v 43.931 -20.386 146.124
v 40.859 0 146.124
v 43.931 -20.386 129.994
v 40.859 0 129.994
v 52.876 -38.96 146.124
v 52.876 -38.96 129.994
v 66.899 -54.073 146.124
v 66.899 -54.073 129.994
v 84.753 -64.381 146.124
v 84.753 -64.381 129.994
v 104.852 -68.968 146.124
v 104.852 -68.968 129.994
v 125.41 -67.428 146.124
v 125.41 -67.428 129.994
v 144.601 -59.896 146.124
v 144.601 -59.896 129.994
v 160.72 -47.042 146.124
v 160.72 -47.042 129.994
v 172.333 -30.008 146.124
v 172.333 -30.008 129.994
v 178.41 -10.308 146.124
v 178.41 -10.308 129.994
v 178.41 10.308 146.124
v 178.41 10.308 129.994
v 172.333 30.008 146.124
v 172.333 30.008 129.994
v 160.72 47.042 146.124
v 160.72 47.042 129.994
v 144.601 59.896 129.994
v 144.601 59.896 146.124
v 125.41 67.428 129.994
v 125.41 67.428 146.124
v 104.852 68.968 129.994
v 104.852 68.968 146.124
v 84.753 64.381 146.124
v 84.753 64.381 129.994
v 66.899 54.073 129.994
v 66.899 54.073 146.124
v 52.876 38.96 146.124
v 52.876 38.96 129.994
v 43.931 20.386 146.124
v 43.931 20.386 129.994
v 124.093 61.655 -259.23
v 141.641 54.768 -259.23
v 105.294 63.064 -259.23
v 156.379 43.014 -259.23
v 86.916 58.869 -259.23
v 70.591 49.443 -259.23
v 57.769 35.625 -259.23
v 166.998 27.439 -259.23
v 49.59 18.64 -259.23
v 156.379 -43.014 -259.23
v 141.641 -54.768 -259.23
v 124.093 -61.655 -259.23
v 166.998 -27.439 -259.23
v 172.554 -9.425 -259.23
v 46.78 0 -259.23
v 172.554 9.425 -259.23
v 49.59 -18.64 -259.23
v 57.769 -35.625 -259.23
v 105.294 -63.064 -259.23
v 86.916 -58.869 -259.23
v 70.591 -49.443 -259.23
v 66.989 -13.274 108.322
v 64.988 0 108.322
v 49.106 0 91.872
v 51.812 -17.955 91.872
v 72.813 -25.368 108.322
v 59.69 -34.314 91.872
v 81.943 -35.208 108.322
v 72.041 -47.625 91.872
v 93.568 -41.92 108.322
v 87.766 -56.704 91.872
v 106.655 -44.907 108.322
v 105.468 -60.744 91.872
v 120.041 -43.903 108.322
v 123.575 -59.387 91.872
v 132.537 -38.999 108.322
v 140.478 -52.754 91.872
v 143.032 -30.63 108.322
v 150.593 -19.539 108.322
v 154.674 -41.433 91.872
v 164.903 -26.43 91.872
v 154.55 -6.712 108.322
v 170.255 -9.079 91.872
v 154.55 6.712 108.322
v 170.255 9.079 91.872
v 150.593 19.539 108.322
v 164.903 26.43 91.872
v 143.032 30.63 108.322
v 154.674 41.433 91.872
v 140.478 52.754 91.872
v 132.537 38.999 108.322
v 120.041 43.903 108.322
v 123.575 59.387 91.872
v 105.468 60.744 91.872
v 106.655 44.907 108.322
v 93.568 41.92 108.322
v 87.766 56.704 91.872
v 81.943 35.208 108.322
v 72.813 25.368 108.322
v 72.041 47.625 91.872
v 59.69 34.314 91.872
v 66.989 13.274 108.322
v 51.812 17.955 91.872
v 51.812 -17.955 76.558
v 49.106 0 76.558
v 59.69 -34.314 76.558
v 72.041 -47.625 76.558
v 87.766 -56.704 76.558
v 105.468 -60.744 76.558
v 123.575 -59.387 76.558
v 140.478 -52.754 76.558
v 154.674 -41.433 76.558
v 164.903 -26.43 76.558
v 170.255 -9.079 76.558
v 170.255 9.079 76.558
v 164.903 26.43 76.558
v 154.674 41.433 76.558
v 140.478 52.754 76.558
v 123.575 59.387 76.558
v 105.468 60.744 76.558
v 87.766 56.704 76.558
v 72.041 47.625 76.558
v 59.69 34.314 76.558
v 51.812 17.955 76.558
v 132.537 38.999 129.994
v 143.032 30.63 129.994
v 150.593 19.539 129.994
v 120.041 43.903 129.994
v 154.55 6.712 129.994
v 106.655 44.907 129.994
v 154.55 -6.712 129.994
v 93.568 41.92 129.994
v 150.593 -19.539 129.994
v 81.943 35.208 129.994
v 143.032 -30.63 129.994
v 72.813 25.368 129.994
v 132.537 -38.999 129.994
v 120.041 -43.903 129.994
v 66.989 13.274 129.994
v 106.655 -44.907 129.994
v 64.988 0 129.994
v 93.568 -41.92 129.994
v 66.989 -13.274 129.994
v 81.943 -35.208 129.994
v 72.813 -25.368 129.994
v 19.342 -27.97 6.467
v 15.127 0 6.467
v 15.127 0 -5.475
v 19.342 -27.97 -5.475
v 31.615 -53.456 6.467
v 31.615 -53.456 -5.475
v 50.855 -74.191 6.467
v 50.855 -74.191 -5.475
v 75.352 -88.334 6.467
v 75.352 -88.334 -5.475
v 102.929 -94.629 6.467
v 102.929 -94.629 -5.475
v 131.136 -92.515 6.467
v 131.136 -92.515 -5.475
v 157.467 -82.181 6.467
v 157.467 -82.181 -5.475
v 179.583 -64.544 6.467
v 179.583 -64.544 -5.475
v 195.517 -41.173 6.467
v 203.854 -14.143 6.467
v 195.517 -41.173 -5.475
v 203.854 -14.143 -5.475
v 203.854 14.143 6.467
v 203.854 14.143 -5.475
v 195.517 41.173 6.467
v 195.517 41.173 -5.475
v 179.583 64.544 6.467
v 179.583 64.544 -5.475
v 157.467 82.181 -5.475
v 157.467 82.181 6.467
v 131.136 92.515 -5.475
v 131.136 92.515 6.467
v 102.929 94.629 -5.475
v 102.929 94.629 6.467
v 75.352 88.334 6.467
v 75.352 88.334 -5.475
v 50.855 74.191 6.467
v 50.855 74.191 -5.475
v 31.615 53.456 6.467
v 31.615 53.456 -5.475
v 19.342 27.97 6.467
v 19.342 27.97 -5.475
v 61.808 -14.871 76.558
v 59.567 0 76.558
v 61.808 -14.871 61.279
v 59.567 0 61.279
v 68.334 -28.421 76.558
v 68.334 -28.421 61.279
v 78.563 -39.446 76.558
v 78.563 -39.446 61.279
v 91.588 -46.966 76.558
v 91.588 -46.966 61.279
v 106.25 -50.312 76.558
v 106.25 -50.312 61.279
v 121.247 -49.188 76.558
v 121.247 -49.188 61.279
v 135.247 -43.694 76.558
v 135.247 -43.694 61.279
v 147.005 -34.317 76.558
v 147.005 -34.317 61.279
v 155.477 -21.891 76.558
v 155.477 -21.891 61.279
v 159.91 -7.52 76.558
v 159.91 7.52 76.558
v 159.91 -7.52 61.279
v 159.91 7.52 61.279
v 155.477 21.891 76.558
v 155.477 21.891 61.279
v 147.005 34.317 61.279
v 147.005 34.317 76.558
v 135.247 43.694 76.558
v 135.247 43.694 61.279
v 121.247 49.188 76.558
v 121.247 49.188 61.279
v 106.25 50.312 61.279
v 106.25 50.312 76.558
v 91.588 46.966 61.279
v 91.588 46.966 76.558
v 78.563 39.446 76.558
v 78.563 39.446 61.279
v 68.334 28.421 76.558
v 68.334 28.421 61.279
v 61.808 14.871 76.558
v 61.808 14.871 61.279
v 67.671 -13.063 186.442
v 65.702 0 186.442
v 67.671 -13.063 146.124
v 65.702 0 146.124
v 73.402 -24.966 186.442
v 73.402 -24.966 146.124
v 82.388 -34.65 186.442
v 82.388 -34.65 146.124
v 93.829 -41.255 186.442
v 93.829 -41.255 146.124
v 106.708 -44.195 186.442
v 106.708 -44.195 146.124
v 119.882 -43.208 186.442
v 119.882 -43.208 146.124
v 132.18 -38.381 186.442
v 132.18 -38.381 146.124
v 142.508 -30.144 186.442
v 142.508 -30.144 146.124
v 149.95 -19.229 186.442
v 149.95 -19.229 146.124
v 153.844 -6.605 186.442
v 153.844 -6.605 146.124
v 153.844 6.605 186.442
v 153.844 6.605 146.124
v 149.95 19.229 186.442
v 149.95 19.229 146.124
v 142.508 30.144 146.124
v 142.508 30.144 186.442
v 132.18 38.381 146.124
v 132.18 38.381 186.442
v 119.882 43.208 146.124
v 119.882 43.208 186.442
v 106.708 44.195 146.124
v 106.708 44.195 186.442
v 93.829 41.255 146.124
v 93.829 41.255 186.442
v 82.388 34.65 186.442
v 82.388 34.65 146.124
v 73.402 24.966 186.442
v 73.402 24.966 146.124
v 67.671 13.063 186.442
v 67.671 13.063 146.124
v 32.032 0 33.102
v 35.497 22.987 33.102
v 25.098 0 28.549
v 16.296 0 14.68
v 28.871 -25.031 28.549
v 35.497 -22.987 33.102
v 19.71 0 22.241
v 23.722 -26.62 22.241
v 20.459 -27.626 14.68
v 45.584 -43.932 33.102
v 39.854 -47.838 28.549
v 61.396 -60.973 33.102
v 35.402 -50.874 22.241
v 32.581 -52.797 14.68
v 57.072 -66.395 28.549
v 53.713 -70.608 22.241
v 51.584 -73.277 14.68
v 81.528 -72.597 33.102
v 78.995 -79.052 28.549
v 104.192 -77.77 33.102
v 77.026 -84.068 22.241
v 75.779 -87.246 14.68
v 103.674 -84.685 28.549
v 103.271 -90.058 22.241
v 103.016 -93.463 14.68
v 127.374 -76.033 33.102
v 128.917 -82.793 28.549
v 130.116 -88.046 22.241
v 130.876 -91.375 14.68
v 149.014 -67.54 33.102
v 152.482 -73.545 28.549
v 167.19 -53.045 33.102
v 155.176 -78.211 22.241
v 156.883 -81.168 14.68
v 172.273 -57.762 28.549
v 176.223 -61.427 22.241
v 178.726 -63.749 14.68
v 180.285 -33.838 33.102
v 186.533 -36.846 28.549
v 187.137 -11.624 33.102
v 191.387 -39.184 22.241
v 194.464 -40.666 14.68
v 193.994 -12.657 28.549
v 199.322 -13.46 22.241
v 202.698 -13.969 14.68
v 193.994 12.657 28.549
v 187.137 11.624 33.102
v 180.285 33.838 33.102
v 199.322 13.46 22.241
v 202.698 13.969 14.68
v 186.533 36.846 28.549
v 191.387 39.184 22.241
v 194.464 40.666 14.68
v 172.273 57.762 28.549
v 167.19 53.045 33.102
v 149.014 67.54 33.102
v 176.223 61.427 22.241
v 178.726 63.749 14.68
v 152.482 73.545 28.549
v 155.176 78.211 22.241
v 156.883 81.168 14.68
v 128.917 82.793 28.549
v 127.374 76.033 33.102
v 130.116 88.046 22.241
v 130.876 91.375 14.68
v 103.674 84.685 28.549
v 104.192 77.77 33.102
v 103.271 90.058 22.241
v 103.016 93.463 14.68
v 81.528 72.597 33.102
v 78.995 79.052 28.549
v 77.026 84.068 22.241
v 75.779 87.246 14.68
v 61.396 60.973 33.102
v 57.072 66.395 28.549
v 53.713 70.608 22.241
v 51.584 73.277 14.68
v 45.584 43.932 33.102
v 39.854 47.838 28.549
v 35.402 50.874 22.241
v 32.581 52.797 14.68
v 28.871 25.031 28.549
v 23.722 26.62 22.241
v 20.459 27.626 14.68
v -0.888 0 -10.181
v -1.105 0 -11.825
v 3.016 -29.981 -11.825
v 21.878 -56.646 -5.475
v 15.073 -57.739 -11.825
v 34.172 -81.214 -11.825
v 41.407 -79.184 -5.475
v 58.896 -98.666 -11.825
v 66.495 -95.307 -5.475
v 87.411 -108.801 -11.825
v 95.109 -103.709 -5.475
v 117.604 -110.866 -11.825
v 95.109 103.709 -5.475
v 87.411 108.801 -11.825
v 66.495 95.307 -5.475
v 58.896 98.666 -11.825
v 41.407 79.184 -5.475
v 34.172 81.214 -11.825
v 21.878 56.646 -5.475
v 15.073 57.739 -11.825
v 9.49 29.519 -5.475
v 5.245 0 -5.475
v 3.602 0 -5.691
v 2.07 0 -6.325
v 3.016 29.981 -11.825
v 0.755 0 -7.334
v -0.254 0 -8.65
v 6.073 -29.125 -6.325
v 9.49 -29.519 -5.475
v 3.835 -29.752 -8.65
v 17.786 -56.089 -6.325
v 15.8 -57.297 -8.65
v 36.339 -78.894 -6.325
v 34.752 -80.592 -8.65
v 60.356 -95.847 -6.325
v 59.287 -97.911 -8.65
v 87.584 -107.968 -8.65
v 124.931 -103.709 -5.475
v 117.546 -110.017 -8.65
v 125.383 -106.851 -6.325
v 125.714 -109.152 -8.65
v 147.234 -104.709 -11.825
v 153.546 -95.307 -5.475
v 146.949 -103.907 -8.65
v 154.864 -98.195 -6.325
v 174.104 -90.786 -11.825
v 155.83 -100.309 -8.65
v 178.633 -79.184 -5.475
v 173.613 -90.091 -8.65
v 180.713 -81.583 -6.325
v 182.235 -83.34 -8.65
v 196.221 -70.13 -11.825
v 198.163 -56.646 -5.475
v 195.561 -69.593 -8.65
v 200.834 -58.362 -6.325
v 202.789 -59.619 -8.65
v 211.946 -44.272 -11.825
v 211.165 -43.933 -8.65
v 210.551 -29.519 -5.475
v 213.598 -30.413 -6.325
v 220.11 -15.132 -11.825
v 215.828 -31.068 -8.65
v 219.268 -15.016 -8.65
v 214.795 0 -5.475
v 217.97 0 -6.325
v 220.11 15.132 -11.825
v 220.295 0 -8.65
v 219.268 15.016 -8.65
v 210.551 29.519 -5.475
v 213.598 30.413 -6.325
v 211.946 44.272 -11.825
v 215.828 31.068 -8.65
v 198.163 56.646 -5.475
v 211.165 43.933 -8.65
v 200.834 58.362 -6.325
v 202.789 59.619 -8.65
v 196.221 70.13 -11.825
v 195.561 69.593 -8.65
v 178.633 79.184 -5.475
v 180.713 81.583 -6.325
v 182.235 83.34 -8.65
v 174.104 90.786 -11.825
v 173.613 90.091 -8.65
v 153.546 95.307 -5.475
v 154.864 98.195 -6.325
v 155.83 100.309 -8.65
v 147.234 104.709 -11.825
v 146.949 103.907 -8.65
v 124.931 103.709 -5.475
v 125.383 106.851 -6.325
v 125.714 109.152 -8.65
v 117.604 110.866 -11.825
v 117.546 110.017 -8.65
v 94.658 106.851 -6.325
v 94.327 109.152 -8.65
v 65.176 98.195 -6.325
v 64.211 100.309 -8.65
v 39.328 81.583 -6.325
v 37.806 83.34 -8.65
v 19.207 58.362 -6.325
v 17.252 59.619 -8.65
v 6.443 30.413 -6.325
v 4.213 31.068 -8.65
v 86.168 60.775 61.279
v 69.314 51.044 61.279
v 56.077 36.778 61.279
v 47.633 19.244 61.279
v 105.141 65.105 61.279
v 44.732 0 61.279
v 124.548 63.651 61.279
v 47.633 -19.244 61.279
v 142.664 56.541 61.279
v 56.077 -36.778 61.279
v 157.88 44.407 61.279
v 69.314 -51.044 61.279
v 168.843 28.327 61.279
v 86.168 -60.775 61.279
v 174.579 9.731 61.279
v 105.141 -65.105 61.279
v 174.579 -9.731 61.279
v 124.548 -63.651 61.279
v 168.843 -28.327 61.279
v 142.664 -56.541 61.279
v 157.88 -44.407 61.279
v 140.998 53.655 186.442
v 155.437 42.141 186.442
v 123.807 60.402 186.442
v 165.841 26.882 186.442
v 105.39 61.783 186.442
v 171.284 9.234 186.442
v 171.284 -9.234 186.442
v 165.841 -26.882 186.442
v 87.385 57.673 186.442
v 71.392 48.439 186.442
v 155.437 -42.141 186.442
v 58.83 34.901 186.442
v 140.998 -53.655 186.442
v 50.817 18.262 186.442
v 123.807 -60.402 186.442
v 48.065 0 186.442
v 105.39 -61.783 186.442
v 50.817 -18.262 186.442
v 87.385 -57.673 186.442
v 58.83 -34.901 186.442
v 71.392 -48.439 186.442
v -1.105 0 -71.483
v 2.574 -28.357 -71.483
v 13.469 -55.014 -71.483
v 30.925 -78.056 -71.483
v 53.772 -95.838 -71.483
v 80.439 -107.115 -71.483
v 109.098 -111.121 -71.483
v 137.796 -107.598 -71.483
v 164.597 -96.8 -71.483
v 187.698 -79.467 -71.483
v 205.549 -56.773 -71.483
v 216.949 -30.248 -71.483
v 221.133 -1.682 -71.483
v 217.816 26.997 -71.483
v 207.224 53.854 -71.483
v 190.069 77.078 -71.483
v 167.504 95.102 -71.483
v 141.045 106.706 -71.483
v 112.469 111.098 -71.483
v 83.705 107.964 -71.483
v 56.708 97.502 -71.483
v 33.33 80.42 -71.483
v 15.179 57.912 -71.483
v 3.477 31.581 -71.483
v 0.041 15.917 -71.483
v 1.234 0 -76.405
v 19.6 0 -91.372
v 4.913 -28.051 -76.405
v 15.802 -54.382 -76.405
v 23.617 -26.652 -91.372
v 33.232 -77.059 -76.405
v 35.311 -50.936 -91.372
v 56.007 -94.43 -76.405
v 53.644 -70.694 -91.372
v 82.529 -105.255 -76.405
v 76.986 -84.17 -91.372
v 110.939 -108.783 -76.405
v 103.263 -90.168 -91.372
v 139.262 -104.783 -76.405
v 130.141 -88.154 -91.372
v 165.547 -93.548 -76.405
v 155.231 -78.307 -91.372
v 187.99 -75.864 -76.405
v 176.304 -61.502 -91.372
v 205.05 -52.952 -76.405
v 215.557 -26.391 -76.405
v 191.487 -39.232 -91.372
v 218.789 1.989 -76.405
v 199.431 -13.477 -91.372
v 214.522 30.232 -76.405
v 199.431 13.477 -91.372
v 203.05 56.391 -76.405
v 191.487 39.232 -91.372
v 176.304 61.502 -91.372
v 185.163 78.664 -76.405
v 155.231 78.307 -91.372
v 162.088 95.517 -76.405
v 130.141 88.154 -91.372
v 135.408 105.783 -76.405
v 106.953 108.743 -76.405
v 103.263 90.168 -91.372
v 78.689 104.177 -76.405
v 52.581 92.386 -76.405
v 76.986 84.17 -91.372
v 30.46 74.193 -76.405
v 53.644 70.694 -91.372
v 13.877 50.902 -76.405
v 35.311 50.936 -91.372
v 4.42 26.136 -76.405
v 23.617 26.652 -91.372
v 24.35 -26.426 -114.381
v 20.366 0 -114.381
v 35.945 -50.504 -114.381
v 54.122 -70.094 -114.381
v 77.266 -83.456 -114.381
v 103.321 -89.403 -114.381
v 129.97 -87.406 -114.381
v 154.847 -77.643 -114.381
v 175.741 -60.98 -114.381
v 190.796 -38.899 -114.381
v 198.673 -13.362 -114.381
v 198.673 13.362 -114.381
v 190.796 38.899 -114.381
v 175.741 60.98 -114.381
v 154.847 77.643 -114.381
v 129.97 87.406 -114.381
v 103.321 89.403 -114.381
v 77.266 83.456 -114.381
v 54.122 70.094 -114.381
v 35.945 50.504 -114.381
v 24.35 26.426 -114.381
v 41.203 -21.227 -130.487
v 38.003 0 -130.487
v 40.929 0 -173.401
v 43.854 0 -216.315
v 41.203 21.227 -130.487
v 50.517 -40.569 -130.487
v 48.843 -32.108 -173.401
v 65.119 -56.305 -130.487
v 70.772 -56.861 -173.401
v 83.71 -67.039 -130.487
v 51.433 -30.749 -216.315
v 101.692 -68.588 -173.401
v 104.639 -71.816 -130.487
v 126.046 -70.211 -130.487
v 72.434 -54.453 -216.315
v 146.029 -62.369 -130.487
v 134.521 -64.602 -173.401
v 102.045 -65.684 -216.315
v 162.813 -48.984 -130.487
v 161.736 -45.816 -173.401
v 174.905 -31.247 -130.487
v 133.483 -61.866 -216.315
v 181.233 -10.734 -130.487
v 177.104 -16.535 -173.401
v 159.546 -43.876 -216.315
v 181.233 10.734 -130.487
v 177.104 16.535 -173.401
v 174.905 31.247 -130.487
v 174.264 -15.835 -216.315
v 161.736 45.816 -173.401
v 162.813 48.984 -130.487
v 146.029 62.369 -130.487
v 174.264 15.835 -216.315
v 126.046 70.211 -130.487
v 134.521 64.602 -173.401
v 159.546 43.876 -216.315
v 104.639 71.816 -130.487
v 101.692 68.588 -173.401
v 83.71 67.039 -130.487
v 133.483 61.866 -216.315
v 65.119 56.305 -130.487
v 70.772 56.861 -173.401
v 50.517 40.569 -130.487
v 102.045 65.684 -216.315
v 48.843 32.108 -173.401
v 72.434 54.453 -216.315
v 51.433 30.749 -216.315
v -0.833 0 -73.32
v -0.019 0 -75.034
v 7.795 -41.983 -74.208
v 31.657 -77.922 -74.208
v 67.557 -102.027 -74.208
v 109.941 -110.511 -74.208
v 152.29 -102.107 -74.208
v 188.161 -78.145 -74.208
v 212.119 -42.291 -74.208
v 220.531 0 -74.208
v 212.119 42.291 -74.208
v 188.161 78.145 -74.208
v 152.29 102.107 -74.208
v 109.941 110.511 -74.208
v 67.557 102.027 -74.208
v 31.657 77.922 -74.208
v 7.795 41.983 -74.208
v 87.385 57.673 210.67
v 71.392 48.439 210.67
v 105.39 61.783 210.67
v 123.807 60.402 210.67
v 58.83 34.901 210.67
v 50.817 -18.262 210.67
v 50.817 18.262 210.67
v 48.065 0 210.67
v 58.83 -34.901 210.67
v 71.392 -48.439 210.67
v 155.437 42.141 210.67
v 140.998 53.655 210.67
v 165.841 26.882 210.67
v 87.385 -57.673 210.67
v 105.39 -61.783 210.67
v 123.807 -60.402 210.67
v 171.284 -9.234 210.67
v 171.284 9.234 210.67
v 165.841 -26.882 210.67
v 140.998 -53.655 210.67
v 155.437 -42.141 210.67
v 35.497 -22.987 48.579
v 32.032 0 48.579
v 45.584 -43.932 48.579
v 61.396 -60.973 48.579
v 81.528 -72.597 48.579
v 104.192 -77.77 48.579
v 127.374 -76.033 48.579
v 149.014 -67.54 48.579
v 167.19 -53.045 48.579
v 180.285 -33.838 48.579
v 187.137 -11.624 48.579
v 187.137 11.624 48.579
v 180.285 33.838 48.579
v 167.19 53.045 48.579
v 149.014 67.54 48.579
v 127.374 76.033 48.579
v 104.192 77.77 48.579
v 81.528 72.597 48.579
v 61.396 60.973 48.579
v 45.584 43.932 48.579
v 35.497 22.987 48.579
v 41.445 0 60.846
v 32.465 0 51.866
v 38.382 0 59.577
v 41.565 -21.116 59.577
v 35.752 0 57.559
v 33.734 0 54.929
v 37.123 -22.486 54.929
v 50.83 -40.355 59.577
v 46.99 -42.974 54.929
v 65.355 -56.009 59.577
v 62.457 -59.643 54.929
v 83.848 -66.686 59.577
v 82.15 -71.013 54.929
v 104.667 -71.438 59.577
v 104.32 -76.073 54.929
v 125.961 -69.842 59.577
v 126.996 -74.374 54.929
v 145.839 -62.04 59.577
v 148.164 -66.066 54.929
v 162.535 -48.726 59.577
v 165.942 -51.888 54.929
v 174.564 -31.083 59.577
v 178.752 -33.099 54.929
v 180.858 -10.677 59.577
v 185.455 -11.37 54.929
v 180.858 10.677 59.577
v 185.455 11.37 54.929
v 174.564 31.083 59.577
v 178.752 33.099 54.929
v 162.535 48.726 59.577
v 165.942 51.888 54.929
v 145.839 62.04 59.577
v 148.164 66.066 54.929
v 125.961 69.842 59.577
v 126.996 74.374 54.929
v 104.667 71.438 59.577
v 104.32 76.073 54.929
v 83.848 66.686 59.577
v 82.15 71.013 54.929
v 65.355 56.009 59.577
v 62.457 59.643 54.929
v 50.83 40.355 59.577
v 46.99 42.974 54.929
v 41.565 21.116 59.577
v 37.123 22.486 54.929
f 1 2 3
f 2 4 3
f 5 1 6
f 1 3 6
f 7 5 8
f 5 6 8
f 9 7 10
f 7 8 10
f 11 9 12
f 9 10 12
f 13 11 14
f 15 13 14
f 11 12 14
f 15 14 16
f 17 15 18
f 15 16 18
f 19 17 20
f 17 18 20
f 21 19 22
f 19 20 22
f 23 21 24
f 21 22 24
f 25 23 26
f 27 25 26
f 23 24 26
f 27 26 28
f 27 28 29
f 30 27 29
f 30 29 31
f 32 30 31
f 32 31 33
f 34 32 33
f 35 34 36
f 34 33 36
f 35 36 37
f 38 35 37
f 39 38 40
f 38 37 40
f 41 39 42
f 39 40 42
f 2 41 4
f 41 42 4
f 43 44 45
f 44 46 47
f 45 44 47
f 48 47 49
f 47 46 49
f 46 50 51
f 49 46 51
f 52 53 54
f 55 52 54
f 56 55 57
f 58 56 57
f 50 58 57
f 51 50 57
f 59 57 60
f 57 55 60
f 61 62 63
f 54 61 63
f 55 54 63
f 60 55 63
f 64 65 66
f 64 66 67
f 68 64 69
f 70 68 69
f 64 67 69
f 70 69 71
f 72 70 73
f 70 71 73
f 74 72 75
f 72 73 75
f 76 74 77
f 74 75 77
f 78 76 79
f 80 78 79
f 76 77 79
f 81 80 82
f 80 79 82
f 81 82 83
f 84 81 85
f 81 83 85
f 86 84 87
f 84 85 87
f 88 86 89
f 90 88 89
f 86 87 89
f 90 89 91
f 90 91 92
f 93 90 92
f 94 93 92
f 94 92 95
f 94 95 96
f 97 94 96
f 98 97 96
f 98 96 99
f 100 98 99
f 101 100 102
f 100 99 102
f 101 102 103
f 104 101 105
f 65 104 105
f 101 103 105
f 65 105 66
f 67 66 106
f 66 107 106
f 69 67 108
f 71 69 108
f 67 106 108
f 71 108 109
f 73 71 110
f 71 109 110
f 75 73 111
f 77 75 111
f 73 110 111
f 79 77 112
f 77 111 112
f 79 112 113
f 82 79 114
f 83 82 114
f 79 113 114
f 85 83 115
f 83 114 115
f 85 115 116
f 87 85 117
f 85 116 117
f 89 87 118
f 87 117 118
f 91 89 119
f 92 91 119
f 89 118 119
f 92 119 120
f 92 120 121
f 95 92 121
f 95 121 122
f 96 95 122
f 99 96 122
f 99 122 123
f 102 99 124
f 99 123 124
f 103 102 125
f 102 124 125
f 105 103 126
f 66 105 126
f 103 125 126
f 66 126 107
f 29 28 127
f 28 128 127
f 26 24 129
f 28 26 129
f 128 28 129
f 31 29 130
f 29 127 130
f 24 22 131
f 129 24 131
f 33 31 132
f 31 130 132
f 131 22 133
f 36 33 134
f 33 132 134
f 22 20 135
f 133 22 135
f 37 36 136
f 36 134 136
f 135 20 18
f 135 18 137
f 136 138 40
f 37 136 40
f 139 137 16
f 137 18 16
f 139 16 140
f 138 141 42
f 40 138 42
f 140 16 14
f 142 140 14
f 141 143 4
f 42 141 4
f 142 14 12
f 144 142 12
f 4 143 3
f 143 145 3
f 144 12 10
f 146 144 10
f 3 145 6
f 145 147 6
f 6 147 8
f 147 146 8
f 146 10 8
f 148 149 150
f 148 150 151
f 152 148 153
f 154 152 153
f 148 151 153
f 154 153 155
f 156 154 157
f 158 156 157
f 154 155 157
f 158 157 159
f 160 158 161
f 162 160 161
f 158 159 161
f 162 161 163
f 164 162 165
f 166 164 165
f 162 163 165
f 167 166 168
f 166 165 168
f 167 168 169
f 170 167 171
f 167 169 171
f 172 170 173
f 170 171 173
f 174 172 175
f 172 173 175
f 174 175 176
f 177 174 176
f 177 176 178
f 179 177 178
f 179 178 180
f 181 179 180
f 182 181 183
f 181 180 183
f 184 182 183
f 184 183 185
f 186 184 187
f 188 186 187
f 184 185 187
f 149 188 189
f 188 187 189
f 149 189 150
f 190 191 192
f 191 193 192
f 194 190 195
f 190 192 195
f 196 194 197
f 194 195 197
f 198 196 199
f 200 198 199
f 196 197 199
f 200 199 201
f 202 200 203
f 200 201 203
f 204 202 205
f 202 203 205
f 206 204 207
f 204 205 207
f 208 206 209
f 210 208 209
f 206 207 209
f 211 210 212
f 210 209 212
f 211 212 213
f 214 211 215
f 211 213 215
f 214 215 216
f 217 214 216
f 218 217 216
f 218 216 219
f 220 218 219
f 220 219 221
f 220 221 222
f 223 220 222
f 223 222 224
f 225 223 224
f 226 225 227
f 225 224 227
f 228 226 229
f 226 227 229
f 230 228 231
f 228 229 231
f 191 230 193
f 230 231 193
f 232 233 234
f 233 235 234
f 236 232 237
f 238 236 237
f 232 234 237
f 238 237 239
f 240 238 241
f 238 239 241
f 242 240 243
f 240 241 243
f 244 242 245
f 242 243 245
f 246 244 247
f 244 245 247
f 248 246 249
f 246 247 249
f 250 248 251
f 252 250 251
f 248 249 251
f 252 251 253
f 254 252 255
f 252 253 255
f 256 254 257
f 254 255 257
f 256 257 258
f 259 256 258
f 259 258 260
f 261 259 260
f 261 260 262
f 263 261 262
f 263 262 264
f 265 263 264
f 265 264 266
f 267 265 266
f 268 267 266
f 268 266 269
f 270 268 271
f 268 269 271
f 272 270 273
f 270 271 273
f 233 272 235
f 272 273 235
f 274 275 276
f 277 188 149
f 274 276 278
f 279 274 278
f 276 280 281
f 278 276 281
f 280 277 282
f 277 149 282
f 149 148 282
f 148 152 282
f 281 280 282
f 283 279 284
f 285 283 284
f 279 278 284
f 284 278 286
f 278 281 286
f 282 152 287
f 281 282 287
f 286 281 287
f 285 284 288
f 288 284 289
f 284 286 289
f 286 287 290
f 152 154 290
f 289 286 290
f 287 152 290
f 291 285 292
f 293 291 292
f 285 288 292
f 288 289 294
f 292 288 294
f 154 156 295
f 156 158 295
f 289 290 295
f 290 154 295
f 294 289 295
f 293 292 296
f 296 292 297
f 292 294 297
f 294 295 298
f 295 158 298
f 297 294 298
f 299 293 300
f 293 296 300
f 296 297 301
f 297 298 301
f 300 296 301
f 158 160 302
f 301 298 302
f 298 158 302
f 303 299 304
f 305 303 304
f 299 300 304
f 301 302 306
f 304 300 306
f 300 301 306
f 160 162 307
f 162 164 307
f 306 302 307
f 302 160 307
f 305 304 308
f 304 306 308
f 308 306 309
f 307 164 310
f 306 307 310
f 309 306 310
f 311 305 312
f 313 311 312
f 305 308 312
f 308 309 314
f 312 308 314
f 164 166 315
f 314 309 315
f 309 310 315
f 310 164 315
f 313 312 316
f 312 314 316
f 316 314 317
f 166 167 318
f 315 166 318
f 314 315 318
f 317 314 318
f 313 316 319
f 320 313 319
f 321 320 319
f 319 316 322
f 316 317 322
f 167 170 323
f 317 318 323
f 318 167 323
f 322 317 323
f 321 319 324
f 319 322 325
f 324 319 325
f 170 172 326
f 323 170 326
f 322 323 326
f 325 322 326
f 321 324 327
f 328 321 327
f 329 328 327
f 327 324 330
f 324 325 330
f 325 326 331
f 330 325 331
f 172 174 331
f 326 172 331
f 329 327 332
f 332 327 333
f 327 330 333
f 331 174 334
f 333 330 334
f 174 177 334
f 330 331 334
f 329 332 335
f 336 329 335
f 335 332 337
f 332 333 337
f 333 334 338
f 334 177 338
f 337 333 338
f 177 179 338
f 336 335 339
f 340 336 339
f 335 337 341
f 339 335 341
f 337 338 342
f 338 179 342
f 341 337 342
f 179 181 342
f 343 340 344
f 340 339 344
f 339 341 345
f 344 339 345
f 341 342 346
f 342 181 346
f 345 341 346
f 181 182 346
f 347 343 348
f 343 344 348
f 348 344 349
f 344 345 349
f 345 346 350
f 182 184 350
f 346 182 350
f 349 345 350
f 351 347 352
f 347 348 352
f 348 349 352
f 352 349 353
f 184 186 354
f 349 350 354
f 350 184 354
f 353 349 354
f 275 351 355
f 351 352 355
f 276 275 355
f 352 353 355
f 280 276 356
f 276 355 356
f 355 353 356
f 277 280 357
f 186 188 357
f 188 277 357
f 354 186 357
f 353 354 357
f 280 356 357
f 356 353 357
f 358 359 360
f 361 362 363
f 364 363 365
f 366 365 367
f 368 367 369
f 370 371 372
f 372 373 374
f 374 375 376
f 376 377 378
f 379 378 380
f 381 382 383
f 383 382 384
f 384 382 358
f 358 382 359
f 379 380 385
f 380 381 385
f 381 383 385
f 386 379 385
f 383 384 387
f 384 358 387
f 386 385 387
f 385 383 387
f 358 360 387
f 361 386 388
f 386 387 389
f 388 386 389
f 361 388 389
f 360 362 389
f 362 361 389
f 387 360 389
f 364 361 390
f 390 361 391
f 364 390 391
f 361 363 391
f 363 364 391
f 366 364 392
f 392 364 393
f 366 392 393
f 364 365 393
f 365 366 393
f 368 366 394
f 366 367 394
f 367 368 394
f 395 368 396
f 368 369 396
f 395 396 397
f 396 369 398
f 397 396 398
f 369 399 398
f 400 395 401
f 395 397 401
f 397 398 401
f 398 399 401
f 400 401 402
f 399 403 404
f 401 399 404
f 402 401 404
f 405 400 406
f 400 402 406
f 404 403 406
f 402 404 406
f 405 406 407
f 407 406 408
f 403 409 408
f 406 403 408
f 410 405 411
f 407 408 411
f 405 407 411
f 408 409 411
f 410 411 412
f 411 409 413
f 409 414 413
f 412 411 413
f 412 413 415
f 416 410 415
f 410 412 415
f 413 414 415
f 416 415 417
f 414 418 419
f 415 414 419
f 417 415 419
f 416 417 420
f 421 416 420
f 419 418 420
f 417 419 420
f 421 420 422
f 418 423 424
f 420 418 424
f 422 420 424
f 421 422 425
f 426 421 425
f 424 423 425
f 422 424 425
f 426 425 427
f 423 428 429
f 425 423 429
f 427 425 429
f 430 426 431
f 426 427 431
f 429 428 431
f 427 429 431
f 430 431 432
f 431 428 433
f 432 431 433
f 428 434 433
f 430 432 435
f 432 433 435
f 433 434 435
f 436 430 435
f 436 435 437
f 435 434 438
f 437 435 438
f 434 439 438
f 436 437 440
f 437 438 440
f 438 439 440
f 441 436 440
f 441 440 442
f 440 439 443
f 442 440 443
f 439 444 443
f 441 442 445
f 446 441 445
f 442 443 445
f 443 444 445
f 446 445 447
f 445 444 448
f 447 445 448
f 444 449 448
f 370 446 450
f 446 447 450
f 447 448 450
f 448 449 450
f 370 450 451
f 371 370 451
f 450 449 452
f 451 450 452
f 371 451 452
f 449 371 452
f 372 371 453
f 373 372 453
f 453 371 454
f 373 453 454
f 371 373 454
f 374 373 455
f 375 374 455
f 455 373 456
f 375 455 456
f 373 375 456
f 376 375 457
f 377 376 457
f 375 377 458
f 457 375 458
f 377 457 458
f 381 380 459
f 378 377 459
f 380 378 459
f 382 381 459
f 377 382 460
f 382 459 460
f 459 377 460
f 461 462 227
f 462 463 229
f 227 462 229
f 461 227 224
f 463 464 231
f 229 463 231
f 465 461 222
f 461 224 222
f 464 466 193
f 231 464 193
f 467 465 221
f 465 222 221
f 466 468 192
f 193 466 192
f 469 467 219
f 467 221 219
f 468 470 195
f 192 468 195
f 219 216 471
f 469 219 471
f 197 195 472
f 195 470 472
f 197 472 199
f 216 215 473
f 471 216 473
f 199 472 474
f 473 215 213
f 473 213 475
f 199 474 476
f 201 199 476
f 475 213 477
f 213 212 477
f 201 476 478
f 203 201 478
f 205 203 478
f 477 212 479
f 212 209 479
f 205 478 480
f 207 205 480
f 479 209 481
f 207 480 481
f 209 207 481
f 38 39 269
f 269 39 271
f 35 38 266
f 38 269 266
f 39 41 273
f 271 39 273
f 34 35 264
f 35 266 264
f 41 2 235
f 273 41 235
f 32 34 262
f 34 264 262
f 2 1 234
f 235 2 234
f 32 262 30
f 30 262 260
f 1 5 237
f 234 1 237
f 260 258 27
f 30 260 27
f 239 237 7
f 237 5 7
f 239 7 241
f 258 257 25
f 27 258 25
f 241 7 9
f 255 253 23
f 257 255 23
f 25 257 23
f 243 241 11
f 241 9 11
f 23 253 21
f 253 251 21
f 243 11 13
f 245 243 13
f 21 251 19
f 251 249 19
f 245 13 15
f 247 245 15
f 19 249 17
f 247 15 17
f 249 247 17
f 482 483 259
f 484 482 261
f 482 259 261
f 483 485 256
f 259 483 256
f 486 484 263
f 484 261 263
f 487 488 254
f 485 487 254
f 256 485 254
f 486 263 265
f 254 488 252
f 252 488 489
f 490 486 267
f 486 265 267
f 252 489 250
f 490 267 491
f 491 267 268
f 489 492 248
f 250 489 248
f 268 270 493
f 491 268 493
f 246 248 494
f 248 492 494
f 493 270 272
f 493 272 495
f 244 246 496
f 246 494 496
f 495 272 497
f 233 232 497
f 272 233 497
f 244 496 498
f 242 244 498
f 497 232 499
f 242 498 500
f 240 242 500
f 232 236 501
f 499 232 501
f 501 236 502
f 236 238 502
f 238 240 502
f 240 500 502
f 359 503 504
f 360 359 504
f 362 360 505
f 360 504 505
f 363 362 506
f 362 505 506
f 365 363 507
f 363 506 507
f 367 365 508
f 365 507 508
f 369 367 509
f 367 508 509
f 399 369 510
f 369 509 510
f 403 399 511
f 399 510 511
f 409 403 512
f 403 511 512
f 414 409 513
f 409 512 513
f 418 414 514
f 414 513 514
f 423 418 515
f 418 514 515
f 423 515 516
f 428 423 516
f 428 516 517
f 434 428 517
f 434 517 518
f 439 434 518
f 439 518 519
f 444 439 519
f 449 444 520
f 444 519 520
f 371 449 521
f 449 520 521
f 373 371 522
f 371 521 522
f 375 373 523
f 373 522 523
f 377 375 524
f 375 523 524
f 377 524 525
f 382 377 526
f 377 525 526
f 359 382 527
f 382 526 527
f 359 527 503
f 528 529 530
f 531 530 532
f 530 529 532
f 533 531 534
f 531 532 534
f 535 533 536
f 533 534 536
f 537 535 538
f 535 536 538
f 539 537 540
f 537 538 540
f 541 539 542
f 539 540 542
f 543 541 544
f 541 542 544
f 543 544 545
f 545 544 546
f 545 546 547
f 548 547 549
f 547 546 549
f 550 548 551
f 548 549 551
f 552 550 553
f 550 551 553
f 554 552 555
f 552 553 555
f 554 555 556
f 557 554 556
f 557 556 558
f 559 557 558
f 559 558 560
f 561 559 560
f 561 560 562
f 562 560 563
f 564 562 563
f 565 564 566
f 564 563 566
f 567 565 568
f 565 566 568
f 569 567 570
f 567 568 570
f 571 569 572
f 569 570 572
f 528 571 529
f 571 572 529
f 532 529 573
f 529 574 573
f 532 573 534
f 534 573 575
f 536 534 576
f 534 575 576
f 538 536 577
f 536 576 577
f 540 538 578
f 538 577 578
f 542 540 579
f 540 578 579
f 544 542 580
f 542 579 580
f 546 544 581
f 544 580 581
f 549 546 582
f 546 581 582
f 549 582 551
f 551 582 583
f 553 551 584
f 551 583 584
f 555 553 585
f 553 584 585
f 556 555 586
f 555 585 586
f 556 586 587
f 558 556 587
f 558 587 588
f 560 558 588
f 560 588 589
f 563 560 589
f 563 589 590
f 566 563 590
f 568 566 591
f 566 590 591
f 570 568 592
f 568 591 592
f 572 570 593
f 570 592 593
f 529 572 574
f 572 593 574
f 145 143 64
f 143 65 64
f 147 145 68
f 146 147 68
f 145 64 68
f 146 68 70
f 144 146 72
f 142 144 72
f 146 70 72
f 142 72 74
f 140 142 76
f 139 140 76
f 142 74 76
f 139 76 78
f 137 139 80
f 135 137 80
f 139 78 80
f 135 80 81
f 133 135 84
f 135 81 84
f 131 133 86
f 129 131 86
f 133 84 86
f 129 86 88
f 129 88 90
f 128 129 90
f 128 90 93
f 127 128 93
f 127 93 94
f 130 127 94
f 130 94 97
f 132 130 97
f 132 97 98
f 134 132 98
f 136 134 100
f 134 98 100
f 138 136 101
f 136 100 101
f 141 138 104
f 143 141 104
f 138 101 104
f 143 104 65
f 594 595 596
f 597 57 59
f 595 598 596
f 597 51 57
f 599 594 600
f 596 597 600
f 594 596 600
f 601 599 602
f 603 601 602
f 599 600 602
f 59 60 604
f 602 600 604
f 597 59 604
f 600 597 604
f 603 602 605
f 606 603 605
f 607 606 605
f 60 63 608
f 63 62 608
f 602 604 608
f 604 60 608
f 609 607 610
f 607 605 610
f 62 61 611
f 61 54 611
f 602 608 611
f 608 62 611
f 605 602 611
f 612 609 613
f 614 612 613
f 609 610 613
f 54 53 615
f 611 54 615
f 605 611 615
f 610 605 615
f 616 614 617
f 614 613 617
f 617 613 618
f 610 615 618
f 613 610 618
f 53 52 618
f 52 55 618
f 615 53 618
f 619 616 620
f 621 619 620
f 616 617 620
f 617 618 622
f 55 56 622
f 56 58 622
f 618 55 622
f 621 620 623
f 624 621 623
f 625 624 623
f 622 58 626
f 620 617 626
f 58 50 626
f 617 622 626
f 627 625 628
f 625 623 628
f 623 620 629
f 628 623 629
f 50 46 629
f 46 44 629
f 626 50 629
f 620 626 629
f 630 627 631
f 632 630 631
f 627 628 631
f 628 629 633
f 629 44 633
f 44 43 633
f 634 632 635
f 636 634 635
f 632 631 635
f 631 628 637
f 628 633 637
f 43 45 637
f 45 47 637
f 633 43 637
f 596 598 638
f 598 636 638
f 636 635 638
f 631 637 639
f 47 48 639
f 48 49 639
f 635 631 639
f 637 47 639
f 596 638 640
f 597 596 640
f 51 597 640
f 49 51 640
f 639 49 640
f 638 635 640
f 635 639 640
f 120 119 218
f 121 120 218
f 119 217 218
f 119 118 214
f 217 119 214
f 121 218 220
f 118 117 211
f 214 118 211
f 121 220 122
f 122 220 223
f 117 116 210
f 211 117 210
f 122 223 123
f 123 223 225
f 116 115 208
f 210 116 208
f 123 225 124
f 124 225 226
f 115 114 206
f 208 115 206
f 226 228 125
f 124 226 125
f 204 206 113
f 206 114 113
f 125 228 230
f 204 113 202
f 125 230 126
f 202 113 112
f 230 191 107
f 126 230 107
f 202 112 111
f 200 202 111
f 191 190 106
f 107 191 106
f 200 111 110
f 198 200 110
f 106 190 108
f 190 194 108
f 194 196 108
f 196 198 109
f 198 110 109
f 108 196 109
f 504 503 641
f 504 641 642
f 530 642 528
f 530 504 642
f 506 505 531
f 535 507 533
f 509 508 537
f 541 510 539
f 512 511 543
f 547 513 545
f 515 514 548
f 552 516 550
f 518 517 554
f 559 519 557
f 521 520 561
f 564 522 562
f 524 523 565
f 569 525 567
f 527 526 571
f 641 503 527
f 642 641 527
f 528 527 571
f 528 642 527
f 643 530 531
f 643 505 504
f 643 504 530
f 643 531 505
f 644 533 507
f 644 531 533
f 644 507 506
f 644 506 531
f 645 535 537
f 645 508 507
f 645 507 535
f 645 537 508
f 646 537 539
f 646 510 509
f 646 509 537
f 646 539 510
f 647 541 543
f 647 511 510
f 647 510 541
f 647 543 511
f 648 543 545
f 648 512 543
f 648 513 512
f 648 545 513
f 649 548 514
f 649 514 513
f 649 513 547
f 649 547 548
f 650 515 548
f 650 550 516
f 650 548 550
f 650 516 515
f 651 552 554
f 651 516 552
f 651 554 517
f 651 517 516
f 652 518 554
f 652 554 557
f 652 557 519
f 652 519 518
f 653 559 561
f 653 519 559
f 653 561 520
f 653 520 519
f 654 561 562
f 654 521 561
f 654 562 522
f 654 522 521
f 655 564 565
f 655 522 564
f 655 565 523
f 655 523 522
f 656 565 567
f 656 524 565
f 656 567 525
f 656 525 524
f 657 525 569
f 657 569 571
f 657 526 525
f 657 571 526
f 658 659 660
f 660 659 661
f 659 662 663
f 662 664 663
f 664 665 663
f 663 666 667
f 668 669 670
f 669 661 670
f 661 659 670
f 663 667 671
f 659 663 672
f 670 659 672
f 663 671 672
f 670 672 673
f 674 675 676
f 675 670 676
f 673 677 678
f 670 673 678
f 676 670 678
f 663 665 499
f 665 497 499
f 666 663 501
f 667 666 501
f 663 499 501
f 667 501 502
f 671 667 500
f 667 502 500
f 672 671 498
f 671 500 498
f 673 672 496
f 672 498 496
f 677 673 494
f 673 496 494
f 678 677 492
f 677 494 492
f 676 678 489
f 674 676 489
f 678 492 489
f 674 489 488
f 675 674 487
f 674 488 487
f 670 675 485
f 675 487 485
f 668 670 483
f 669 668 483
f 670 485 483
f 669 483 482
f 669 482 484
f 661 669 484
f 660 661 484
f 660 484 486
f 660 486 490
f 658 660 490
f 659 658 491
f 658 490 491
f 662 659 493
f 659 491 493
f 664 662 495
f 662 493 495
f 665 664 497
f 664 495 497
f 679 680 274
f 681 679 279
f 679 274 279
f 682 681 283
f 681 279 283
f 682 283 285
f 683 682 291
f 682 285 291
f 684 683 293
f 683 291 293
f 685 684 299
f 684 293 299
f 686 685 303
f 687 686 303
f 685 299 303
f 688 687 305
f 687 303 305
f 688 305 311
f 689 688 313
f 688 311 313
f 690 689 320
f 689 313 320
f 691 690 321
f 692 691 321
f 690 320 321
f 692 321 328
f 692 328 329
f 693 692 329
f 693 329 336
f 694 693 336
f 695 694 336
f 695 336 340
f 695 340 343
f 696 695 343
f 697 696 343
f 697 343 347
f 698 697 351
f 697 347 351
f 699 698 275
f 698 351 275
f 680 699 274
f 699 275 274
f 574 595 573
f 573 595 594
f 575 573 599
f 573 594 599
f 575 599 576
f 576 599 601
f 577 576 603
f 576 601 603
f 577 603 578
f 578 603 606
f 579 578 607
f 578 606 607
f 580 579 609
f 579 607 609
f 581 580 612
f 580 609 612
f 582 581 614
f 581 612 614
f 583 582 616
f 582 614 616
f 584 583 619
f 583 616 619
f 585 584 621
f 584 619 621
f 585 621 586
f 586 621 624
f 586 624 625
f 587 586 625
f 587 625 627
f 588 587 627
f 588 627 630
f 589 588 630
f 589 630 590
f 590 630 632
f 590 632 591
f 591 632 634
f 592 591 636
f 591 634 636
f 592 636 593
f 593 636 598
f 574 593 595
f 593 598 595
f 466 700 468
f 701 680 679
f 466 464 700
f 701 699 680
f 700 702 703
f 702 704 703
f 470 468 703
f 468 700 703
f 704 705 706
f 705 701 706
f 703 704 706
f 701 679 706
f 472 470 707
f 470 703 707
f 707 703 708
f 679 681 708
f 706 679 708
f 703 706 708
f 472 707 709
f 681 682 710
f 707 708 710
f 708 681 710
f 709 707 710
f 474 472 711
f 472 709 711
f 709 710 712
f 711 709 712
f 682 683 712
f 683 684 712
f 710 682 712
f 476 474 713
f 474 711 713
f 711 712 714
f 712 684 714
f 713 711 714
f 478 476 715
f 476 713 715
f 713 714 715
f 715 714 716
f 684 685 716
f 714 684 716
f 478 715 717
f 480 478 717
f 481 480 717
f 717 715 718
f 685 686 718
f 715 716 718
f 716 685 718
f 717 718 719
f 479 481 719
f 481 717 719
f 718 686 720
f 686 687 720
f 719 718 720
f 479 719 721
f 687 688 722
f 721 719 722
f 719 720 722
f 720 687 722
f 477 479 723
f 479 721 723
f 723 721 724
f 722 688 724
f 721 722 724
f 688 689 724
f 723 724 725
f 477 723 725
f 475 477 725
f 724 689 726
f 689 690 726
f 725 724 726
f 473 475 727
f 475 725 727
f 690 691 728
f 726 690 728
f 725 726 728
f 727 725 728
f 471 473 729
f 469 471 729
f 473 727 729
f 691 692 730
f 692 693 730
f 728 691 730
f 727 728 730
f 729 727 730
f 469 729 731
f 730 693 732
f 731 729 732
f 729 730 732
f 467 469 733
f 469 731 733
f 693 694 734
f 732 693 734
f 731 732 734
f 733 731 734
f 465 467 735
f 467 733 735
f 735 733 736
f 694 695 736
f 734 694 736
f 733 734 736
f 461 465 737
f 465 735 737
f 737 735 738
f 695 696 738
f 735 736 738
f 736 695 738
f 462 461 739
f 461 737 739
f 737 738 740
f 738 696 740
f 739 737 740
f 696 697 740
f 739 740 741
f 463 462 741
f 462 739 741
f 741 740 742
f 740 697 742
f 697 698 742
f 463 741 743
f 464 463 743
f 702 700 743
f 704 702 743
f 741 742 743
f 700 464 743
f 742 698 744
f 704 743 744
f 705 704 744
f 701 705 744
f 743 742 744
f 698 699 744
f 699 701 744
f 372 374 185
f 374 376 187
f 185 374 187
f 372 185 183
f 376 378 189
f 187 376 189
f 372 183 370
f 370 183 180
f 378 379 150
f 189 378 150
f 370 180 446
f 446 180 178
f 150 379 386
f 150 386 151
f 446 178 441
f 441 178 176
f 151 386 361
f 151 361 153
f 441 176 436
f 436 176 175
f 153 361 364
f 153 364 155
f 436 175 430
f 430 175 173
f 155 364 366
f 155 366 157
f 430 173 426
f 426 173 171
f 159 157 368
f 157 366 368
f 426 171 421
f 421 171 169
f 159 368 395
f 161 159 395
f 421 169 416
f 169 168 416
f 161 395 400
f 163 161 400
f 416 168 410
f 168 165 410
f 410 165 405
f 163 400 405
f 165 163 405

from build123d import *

# Parameters (mm, degrees)
F2_R = 12.7
F4_R = 6.35


# Not quite as in the source:
# - a fillet or chamfer that OpenCascade refuses, or shapes differently, is made with other operations: its cross-section is extruded or revolved along the edge and cut away or added


with BuildPart() as f1:
    # F0 (on Front) → F1 (revolve)
    with BuildSketch(Plane.XZ):
        Polygon((46.7799907497, -259.2296465031), (110.0204106454, -259.2296465031), (110.0204106454, 210.6703534969), (48.0645865742, 210.6703534969), (48.0645865742, 186.4424991518), (65.7015453758, 186.4424991518), (65.7015453758, 146.1238006124), (40.8587217282, 146.1238006124), (40.8587217282, 129.9940093533), (64.9879317765, 129.9940093533), (64.9879317765, 108.3219168065), (49.1057302837, 91.8724802611), (49.1057302837, 76.5575138209), (59.5669516537, 76.5575138209), (59.5669516537, 61.2788777338), (32.0324628472, 61.2788777338), (32.0324628472, 33.1022732576), (15.1265001614, 33.1022732576), (15.1265001614, -5.4745311297), (-1.1045893546, -5.4745311297), (-1.1045893546, -74.4996249259), (19.5996663081, -91.3724261251), (20.3664886729, -114.3807911865), (38.0034474745, -130.4866455729), align=None)
    revolve(axis=Axis((110.0204106454, 0, -24.2796465031), (0, 0, 1)))

    # F2
    f2_edges = [f1.edges().sort_by_distance(p)[0] for p in [
        (188.008358, 0, 61.278878),
    ]]
    fillet(f2_edges, radius=F2_R)

    # F3: fillet of radius 29.4340917525 on 1 edges, made by hand

    # F3_s1 → F3_t2 (revolve, cut)
    with BuildSketch(Plane.XZ):
        with BuildLine():
            ThreePointArc((32.0324628472, 33.1022732576), (19.7098388295, 22.2410689464), (15.1265001614, 6.4674888699))
            Line((15.1265001614, 6.4674888699), (15.1265001614, 33.1022732576))
            Line((15.1265001614, 33.1022732576), (32.0324628472, 33.1022732576))
        make_face()
    revolve(axis=Axis((110.0204106454, 0, 33.1022732576), (0, 0, 1)), mode=Mode.SUBTRACT)

    # F4
    f4_edges = [f1.edges().sort_by_distance(p)[0] for p in [
        (221.145411, 0, -5.474531),
        (221.145411, 0, -74.499625),
    ]]
    fillet(f4_edges, radius=F4_R)


solid = f1.part
